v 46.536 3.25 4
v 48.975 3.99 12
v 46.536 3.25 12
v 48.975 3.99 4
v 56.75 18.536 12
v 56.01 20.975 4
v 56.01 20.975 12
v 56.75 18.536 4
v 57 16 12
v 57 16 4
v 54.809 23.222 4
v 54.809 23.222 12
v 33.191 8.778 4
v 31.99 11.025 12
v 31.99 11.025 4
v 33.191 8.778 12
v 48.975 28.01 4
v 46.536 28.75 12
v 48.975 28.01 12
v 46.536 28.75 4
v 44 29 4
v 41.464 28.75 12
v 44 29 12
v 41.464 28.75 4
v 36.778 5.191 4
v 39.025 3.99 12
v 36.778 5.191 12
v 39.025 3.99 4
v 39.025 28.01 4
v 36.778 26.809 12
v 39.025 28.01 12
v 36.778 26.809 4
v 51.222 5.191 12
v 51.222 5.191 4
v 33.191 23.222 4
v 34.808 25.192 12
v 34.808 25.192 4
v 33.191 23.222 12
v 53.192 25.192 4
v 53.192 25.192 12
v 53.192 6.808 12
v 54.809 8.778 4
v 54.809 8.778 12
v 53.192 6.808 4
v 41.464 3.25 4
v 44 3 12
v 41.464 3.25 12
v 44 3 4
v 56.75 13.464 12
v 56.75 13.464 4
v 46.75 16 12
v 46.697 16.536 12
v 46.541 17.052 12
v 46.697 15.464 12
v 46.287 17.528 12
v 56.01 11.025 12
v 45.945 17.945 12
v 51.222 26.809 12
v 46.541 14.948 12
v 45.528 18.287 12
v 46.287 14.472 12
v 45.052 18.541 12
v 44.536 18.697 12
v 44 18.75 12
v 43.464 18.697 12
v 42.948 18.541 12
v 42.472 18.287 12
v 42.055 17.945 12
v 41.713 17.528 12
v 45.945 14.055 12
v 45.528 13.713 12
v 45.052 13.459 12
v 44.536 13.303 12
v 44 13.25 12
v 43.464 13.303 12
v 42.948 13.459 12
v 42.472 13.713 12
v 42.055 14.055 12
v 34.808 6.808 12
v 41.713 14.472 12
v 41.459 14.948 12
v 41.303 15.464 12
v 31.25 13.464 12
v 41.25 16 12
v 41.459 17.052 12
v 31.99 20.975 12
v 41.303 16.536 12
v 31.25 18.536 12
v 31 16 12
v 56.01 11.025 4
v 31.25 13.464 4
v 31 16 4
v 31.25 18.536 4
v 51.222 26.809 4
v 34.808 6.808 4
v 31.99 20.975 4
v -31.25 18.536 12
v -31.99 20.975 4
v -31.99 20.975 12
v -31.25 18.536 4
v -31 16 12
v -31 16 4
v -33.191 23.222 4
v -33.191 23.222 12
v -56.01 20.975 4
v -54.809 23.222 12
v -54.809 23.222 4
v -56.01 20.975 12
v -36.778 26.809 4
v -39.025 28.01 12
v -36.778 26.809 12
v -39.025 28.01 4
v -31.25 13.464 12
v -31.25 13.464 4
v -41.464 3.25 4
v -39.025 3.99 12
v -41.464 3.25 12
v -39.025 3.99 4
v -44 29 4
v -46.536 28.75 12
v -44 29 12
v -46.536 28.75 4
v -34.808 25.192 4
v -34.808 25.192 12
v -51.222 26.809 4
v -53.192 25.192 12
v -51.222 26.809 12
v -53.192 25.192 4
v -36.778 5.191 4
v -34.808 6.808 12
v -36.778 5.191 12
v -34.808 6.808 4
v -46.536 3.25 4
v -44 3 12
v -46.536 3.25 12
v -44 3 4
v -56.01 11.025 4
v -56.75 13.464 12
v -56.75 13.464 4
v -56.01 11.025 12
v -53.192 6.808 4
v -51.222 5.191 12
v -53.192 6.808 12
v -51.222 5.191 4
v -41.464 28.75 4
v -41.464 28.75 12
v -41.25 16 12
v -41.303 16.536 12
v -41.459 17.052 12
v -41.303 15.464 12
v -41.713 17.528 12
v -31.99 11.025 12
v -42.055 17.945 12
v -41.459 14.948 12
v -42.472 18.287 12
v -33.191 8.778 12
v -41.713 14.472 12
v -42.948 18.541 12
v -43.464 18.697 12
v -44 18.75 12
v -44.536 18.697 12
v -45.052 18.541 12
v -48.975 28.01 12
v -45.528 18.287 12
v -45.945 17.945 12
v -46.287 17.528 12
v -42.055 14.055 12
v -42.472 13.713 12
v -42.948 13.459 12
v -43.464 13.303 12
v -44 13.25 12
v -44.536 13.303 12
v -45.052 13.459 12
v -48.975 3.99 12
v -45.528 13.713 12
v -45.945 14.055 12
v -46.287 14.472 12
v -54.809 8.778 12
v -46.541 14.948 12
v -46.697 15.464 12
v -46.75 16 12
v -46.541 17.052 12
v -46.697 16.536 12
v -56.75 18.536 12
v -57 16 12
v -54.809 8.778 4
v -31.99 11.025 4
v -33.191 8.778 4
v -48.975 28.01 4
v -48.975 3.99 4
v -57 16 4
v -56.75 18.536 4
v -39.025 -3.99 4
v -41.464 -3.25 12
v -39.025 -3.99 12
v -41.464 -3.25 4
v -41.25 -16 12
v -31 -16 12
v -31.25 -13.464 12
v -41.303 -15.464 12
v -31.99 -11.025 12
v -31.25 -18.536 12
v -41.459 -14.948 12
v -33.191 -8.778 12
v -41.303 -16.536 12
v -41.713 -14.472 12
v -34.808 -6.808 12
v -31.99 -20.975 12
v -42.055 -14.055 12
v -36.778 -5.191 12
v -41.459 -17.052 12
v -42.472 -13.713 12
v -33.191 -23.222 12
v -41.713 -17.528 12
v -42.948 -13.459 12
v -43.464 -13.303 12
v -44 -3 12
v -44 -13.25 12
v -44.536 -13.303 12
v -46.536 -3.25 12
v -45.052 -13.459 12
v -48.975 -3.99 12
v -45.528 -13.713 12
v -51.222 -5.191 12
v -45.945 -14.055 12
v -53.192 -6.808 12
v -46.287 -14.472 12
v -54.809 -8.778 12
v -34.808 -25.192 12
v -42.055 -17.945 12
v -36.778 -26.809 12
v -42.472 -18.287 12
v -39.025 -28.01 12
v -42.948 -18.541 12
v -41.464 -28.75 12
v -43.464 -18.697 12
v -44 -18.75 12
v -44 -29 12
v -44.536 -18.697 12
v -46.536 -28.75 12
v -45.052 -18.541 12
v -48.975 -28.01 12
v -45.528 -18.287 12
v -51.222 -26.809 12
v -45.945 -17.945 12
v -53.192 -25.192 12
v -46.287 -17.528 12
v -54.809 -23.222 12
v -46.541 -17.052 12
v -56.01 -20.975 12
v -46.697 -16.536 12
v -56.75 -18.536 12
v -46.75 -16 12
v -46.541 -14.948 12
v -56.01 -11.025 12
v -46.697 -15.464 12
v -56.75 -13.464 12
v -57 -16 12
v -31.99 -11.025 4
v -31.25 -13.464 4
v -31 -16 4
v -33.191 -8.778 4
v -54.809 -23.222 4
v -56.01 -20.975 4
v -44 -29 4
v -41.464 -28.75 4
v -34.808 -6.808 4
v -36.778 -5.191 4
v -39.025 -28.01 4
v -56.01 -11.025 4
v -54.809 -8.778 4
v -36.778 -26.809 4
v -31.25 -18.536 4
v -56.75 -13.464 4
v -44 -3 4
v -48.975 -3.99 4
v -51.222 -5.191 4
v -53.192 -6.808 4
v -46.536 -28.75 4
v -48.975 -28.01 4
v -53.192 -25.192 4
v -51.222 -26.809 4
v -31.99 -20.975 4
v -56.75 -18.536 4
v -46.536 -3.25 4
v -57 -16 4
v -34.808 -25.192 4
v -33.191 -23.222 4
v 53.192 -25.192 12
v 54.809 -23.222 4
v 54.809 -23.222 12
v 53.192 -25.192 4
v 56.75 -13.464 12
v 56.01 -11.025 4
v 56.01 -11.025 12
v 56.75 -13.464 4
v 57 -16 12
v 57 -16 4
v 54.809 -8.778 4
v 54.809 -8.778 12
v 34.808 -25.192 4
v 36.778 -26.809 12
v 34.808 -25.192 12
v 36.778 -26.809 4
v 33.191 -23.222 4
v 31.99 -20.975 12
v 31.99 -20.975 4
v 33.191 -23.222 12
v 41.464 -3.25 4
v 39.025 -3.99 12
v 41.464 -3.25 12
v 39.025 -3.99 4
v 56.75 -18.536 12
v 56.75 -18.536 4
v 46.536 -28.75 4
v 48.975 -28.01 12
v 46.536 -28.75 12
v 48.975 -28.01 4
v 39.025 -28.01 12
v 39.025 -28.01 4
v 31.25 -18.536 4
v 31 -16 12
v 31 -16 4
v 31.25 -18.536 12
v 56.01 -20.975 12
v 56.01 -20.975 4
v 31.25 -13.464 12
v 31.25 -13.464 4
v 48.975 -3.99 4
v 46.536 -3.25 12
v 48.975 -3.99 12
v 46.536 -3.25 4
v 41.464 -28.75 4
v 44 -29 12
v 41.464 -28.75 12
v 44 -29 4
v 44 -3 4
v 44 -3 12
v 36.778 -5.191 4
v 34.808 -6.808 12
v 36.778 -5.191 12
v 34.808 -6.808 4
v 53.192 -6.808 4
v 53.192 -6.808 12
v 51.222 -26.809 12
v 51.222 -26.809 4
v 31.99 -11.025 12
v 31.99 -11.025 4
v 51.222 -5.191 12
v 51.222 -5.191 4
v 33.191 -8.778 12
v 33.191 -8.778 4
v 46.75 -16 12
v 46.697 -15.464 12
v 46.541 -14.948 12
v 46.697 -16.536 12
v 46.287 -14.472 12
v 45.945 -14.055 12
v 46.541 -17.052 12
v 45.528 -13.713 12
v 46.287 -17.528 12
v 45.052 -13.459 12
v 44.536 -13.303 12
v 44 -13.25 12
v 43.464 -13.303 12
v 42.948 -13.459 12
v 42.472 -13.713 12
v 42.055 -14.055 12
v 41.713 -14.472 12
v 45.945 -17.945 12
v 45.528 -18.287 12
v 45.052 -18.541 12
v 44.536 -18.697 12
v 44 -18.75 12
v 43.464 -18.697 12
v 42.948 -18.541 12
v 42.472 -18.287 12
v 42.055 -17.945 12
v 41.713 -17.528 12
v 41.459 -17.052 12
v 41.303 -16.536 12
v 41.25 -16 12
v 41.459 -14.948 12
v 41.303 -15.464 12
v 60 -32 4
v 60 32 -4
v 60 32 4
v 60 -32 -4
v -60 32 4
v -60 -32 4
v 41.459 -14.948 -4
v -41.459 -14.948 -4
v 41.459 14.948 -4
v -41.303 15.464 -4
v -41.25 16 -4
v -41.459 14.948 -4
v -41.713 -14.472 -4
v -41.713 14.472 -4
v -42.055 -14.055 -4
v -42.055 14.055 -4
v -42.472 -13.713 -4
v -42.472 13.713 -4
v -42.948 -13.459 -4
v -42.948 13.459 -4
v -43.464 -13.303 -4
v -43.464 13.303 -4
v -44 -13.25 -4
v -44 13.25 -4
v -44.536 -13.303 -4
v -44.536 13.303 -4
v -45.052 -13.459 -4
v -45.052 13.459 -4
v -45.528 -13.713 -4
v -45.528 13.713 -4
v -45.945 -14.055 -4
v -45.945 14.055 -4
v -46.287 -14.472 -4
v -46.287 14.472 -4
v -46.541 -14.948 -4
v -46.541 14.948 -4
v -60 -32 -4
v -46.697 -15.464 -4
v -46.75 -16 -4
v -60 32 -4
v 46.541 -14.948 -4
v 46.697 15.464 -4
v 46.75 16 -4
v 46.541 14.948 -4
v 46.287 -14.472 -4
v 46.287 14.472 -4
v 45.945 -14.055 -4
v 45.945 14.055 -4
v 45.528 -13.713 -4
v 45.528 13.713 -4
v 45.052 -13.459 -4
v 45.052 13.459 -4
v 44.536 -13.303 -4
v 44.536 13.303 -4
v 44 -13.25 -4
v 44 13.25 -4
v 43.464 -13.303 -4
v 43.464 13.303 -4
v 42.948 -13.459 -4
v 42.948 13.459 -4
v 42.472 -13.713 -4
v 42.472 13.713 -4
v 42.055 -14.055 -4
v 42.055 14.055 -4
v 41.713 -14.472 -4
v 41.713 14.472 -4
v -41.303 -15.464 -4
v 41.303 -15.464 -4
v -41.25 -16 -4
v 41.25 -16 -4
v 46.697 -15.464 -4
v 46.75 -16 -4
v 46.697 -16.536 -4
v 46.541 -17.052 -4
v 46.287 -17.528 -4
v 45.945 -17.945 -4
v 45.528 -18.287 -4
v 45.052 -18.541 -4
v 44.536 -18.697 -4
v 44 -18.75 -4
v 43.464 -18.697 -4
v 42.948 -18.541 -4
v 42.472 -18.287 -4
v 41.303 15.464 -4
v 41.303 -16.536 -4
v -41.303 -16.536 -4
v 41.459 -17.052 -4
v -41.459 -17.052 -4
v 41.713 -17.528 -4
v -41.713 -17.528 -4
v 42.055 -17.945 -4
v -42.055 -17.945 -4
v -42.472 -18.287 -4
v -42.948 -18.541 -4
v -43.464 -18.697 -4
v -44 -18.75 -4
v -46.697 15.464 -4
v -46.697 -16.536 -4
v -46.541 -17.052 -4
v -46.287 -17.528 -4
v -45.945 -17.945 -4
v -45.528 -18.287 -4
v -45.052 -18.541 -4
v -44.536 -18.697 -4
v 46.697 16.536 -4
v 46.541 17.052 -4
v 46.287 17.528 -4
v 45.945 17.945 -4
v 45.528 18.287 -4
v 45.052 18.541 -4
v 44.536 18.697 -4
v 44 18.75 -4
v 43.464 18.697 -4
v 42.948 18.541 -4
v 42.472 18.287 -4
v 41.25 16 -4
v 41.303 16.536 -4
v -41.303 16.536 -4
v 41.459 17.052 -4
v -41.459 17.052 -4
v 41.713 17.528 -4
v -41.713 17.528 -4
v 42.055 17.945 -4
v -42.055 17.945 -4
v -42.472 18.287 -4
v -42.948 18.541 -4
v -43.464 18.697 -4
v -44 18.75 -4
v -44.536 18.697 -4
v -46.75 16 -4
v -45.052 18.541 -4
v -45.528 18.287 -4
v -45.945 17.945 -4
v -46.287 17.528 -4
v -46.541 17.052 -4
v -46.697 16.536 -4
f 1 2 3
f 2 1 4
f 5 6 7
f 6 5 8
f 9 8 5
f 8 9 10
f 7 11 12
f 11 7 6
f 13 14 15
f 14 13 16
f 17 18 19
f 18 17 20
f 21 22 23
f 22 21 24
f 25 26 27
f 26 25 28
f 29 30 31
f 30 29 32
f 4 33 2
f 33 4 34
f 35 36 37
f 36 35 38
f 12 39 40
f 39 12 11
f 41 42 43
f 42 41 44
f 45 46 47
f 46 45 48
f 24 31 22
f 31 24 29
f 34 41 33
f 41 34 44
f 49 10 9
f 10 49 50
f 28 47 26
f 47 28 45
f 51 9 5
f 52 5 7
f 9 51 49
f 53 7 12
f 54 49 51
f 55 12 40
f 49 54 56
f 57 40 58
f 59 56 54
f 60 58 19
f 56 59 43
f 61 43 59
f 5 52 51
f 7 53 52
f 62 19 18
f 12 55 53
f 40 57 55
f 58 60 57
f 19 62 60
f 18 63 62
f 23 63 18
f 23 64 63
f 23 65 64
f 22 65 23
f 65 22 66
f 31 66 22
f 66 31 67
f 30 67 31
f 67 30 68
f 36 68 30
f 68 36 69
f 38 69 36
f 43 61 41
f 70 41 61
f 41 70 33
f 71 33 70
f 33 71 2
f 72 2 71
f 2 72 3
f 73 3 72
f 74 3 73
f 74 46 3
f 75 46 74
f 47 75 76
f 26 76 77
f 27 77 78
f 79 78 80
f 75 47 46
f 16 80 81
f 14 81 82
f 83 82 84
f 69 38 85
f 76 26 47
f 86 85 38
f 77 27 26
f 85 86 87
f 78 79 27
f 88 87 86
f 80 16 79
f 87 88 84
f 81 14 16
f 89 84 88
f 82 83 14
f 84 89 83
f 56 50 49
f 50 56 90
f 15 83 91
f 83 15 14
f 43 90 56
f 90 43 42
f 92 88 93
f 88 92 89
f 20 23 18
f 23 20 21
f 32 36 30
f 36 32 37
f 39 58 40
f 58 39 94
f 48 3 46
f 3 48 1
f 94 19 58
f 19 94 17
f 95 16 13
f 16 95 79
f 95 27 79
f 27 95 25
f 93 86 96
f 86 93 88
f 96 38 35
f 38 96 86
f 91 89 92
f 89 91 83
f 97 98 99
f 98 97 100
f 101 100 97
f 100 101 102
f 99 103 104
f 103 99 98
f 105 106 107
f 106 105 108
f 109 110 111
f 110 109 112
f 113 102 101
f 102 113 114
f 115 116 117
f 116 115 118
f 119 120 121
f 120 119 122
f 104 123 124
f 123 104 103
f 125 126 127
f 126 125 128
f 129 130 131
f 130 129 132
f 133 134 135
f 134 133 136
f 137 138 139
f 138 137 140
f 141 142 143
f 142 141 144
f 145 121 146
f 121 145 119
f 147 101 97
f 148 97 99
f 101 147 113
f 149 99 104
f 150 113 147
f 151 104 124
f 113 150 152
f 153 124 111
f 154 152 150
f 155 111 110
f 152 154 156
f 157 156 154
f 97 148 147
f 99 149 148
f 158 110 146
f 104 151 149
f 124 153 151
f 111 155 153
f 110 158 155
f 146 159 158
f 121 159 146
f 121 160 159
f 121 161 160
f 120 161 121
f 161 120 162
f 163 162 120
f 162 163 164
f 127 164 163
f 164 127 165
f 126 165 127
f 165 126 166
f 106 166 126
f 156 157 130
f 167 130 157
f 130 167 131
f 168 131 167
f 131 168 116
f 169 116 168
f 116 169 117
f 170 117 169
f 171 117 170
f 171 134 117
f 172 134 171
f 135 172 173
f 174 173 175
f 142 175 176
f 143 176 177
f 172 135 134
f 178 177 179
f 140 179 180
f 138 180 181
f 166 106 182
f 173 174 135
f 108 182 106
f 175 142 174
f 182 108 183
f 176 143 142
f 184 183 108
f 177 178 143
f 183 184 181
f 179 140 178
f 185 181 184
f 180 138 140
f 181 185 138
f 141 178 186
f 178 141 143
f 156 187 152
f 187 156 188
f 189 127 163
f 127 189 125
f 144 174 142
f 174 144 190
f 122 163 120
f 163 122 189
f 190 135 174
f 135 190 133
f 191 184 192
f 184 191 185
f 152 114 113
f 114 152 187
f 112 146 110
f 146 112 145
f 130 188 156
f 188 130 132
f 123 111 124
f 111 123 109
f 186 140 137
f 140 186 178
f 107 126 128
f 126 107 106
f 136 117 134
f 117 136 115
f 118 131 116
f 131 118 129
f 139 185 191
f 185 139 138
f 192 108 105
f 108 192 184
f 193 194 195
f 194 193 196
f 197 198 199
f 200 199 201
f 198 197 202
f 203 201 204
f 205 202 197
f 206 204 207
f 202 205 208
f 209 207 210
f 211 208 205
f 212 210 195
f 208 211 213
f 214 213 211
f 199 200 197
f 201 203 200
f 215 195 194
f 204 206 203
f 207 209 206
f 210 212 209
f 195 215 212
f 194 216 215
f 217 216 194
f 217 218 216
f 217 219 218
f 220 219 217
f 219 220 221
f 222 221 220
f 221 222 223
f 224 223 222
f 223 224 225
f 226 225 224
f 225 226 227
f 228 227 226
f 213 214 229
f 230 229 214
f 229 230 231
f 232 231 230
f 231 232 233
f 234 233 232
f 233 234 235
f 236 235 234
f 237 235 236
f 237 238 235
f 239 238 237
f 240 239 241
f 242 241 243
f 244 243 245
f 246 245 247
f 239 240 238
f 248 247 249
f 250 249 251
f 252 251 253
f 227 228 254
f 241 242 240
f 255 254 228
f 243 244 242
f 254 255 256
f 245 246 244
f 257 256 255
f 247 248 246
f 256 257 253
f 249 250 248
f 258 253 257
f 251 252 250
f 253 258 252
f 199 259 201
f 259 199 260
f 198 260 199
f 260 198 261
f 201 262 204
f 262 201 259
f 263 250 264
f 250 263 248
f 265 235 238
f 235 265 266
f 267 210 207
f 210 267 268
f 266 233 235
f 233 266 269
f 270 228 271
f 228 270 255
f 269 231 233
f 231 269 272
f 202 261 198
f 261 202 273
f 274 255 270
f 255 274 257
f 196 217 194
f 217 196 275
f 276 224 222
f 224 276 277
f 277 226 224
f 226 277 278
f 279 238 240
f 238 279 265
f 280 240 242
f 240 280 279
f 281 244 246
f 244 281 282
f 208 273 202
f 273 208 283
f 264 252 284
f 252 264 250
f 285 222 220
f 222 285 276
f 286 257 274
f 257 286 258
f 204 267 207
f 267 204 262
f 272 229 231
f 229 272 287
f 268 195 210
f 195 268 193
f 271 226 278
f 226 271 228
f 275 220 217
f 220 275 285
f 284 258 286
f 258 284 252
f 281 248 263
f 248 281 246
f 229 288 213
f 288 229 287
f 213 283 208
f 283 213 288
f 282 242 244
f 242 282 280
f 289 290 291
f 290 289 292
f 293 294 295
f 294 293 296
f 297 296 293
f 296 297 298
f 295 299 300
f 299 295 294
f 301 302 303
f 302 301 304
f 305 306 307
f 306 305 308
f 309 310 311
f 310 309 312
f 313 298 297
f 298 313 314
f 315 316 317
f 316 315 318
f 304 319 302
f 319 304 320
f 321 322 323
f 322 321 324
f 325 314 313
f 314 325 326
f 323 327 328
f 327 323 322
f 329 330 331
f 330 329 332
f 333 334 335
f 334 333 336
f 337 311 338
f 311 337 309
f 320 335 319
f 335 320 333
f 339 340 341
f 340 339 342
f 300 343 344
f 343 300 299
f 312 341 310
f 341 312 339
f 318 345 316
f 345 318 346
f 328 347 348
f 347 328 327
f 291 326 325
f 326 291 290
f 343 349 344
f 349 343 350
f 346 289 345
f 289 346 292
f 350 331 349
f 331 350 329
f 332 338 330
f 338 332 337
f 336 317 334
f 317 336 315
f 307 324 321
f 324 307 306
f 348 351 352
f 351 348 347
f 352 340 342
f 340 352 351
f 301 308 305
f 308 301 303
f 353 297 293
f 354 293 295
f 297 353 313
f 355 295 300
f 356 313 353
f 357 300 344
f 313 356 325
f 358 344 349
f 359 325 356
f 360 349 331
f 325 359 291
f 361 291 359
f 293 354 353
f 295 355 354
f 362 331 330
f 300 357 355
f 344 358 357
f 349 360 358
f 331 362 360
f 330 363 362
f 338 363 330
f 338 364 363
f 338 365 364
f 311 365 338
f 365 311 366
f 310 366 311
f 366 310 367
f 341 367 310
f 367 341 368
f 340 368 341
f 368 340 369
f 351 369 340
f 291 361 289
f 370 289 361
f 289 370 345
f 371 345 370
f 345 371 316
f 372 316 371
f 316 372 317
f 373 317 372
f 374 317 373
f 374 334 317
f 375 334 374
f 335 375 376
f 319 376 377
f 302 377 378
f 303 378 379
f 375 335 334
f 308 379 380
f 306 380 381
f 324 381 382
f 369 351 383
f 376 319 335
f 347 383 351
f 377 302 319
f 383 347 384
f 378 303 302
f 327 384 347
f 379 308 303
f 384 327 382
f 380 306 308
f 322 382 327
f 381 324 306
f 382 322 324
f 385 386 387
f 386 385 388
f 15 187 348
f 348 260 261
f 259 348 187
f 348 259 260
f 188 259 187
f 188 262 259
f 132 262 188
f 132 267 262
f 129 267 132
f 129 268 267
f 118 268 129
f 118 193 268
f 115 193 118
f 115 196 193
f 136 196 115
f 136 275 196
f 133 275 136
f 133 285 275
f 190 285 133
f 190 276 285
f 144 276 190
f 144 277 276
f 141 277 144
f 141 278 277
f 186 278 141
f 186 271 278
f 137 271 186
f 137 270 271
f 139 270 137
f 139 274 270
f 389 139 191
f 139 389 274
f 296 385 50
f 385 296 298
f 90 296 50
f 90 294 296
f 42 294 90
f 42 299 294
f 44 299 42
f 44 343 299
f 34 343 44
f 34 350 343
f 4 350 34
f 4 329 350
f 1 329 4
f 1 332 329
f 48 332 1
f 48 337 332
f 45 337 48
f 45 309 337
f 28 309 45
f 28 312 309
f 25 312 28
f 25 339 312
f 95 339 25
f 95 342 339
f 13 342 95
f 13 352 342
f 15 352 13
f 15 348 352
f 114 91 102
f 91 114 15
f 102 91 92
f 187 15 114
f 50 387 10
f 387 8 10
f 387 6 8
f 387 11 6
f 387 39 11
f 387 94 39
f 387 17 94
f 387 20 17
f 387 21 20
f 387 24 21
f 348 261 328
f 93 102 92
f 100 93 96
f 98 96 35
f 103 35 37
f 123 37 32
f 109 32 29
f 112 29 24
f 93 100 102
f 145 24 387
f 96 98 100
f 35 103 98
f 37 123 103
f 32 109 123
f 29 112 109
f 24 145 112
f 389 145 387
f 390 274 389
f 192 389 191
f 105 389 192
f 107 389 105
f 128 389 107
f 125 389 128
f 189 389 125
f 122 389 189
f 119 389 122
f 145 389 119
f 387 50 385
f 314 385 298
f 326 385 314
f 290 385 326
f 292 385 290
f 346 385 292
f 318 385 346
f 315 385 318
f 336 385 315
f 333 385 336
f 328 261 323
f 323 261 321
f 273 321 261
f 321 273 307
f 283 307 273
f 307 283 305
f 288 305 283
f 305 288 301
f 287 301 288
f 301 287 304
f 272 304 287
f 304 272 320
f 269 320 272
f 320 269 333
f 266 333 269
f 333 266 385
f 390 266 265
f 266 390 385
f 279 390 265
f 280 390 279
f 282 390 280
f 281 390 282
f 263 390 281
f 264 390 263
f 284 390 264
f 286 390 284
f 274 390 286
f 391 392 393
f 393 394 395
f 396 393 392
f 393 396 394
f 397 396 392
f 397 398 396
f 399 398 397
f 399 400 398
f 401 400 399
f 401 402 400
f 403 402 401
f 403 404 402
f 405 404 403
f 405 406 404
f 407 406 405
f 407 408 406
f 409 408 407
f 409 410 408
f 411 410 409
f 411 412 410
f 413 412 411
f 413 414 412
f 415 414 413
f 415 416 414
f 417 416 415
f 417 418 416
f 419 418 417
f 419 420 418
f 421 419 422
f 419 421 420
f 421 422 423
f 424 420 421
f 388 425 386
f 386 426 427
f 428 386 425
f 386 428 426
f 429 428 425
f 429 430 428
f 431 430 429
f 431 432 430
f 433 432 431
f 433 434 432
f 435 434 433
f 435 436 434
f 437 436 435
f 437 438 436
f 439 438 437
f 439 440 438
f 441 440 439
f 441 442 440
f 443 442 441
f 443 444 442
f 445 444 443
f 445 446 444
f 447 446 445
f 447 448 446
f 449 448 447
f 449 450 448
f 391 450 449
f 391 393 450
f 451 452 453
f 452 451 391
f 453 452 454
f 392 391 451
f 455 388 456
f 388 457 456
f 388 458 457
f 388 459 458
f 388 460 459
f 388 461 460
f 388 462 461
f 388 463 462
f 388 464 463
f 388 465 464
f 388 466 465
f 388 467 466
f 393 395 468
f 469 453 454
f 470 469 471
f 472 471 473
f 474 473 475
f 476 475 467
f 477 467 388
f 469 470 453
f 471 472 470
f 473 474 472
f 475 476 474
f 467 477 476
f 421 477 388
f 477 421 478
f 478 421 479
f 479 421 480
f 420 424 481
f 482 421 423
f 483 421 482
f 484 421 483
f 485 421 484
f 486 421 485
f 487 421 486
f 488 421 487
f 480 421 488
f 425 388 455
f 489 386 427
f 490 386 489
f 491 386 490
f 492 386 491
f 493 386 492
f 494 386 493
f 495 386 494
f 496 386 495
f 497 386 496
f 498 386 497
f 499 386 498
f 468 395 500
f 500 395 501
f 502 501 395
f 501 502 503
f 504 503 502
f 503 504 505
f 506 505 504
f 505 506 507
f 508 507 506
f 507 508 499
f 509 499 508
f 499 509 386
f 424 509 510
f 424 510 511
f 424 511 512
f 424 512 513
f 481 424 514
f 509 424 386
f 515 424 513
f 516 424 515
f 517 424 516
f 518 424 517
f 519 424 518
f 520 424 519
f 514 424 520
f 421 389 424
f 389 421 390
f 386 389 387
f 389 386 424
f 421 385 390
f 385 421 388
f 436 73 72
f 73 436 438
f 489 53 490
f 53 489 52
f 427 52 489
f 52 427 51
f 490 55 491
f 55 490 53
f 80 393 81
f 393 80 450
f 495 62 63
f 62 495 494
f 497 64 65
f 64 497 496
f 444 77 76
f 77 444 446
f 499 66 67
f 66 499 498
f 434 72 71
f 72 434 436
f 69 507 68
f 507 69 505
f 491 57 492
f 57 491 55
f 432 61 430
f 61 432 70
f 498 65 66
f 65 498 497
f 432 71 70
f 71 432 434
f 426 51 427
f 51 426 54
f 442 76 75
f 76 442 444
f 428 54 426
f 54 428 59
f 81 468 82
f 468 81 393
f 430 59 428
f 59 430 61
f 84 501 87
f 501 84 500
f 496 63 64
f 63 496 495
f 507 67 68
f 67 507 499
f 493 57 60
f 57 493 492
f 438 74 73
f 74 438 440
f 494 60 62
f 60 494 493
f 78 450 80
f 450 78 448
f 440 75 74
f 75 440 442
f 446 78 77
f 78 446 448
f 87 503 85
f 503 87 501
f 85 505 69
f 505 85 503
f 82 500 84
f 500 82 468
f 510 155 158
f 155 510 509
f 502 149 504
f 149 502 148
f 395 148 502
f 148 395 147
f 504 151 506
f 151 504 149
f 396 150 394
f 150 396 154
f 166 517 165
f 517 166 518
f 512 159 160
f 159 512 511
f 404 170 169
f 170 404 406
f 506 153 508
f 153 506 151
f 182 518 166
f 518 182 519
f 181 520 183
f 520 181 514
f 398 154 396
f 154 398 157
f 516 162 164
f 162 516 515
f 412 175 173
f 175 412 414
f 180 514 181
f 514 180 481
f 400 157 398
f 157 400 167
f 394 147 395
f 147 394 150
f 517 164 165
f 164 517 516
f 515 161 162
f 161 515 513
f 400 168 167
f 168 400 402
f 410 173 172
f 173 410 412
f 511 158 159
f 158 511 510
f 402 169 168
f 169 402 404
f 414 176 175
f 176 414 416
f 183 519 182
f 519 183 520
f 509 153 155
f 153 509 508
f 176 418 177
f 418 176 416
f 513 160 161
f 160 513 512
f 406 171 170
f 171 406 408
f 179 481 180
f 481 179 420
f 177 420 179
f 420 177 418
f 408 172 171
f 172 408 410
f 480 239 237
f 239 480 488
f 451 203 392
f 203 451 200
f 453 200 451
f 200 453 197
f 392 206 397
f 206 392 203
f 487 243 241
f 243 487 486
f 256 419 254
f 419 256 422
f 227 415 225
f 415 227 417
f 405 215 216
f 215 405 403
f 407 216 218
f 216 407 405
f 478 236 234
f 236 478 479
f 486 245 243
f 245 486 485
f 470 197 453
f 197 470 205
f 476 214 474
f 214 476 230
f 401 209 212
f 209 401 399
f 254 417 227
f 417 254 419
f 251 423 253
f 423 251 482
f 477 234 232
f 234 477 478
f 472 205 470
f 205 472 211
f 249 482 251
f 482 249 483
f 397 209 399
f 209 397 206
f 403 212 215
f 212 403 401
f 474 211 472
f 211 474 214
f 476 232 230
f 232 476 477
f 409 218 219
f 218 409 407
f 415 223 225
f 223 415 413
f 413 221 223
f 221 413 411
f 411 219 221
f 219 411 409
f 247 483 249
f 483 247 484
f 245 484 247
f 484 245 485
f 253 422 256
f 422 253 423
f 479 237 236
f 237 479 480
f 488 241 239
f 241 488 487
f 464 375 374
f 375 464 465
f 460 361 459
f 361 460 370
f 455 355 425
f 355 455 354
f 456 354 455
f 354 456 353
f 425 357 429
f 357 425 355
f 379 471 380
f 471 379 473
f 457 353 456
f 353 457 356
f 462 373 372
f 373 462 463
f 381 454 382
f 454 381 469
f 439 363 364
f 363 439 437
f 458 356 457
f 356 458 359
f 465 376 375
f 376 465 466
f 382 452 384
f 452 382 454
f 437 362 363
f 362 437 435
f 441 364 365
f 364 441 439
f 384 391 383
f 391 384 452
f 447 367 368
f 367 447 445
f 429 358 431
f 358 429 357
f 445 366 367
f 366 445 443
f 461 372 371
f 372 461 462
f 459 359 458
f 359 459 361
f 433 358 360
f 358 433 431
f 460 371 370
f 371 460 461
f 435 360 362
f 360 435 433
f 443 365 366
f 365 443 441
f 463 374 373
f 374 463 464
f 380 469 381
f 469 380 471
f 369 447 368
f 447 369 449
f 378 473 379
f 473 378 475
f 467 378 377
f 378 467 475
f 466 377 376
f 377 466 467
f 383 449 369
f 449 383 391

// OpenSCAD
$fn = 32;

// ----------------------------------------------------------------------
// Anchor pads 120 x 64 x 16
// four corner bosses with anchor holes
// ----------------------------------------------------------------------

// --- parameters (mm) ---
plate = [120, 64, 8];  // base plate size (x, y, z)
pads = 4;              // boss count, one per corner
edge = 16;             // boss centre offset from the plate edge
boss_d = 26;           // boss diameter
boss_h = 8;            // boss height above the base plate
hole_d = 5.5;          // hole diameter

// --- derived feature positions (mm) ---
height = plate[2] + boss_h;      // = 16   overall height of the part
corner_x = plate[0] / 2 - edge;  // = 44   boss centre X
corner_y = plate[1] / 2 - edge;  // = 16   boss centre Y
feature_centers = [
  [corner_x, corner_y],
  [-corner_x, corner_y],
  [-corner_x, -corner_y],
  [corner_x, -corner_y]
];   // boss centres, anchor holes are drilled there

// base plate, four bosses standing on it, anchor holes all the way through
difference() {
  union() {
    cube(plate, center = true);
    for (centre = feature_centers)
      translate([centre[0], centre[1], plate[2] / 2 - 1])
        cylinder(d = boss_d, h = boss_h + 1);
  }
  for (centre = feature_centers)
    translate([centre[0], centre[1], -height])
      cylinder(d = hole_d, h = 2 * height + 2);  // through boss and plate
}
